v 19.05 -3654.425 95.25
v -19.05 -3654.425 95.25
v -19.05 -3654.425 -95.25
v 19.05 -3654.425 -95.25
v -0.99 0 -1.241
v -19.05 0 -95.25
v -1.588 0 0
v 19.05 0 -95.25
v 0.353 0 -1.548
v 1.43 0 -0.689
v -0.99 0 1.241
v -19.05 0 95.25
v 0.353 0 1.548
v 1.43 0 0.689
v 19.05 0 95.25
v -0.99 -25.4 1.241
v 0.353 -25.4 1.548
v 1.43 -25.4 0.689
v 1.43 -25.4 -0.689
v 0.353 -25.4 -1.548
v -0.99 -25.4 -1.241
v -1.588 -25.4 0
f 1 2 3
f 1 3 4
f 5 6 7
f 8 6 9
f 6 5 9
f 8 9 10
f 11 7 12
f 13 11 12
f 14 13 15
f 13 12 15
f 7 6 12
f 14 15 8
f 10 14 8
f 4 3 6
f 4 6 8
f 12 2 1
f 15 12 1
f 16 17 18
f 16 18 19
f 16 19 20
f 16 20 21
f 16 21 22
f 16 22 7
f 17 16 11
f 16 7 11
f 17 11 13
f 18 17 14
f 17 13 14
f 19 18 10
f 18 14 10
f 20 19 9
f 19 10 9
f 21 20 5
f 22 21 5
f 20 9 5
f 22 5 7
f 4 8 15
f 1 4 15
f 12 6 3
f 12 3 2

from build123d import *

# Parameters (mm, degrees)
F0_W     = 38.1
F0_H     = 190.5
F1_DEPTH = 3654.425
F2_R     = 1.5875
F3_DEPTH = 25.4


with BuildPart() as f1:
    # F0 (on Front) → F1 (new body)
    with BuildSketch(Plane.XZ):
        Rectangle(F0_W, F0_H)
    extrude(amount=F1_DEPTH)

    # F2 (on face) → F3 (cut)
    with BuildSketch(Plane(origin=(0, 0, 0), x_dir=(-1, 0, 0), z_dir=(0, 1, 0))):
        Circle(F2_R)
    extrude(amount=-F3_DEPTH, mode=Mode.SUBTRACT)


solid = f1.part
